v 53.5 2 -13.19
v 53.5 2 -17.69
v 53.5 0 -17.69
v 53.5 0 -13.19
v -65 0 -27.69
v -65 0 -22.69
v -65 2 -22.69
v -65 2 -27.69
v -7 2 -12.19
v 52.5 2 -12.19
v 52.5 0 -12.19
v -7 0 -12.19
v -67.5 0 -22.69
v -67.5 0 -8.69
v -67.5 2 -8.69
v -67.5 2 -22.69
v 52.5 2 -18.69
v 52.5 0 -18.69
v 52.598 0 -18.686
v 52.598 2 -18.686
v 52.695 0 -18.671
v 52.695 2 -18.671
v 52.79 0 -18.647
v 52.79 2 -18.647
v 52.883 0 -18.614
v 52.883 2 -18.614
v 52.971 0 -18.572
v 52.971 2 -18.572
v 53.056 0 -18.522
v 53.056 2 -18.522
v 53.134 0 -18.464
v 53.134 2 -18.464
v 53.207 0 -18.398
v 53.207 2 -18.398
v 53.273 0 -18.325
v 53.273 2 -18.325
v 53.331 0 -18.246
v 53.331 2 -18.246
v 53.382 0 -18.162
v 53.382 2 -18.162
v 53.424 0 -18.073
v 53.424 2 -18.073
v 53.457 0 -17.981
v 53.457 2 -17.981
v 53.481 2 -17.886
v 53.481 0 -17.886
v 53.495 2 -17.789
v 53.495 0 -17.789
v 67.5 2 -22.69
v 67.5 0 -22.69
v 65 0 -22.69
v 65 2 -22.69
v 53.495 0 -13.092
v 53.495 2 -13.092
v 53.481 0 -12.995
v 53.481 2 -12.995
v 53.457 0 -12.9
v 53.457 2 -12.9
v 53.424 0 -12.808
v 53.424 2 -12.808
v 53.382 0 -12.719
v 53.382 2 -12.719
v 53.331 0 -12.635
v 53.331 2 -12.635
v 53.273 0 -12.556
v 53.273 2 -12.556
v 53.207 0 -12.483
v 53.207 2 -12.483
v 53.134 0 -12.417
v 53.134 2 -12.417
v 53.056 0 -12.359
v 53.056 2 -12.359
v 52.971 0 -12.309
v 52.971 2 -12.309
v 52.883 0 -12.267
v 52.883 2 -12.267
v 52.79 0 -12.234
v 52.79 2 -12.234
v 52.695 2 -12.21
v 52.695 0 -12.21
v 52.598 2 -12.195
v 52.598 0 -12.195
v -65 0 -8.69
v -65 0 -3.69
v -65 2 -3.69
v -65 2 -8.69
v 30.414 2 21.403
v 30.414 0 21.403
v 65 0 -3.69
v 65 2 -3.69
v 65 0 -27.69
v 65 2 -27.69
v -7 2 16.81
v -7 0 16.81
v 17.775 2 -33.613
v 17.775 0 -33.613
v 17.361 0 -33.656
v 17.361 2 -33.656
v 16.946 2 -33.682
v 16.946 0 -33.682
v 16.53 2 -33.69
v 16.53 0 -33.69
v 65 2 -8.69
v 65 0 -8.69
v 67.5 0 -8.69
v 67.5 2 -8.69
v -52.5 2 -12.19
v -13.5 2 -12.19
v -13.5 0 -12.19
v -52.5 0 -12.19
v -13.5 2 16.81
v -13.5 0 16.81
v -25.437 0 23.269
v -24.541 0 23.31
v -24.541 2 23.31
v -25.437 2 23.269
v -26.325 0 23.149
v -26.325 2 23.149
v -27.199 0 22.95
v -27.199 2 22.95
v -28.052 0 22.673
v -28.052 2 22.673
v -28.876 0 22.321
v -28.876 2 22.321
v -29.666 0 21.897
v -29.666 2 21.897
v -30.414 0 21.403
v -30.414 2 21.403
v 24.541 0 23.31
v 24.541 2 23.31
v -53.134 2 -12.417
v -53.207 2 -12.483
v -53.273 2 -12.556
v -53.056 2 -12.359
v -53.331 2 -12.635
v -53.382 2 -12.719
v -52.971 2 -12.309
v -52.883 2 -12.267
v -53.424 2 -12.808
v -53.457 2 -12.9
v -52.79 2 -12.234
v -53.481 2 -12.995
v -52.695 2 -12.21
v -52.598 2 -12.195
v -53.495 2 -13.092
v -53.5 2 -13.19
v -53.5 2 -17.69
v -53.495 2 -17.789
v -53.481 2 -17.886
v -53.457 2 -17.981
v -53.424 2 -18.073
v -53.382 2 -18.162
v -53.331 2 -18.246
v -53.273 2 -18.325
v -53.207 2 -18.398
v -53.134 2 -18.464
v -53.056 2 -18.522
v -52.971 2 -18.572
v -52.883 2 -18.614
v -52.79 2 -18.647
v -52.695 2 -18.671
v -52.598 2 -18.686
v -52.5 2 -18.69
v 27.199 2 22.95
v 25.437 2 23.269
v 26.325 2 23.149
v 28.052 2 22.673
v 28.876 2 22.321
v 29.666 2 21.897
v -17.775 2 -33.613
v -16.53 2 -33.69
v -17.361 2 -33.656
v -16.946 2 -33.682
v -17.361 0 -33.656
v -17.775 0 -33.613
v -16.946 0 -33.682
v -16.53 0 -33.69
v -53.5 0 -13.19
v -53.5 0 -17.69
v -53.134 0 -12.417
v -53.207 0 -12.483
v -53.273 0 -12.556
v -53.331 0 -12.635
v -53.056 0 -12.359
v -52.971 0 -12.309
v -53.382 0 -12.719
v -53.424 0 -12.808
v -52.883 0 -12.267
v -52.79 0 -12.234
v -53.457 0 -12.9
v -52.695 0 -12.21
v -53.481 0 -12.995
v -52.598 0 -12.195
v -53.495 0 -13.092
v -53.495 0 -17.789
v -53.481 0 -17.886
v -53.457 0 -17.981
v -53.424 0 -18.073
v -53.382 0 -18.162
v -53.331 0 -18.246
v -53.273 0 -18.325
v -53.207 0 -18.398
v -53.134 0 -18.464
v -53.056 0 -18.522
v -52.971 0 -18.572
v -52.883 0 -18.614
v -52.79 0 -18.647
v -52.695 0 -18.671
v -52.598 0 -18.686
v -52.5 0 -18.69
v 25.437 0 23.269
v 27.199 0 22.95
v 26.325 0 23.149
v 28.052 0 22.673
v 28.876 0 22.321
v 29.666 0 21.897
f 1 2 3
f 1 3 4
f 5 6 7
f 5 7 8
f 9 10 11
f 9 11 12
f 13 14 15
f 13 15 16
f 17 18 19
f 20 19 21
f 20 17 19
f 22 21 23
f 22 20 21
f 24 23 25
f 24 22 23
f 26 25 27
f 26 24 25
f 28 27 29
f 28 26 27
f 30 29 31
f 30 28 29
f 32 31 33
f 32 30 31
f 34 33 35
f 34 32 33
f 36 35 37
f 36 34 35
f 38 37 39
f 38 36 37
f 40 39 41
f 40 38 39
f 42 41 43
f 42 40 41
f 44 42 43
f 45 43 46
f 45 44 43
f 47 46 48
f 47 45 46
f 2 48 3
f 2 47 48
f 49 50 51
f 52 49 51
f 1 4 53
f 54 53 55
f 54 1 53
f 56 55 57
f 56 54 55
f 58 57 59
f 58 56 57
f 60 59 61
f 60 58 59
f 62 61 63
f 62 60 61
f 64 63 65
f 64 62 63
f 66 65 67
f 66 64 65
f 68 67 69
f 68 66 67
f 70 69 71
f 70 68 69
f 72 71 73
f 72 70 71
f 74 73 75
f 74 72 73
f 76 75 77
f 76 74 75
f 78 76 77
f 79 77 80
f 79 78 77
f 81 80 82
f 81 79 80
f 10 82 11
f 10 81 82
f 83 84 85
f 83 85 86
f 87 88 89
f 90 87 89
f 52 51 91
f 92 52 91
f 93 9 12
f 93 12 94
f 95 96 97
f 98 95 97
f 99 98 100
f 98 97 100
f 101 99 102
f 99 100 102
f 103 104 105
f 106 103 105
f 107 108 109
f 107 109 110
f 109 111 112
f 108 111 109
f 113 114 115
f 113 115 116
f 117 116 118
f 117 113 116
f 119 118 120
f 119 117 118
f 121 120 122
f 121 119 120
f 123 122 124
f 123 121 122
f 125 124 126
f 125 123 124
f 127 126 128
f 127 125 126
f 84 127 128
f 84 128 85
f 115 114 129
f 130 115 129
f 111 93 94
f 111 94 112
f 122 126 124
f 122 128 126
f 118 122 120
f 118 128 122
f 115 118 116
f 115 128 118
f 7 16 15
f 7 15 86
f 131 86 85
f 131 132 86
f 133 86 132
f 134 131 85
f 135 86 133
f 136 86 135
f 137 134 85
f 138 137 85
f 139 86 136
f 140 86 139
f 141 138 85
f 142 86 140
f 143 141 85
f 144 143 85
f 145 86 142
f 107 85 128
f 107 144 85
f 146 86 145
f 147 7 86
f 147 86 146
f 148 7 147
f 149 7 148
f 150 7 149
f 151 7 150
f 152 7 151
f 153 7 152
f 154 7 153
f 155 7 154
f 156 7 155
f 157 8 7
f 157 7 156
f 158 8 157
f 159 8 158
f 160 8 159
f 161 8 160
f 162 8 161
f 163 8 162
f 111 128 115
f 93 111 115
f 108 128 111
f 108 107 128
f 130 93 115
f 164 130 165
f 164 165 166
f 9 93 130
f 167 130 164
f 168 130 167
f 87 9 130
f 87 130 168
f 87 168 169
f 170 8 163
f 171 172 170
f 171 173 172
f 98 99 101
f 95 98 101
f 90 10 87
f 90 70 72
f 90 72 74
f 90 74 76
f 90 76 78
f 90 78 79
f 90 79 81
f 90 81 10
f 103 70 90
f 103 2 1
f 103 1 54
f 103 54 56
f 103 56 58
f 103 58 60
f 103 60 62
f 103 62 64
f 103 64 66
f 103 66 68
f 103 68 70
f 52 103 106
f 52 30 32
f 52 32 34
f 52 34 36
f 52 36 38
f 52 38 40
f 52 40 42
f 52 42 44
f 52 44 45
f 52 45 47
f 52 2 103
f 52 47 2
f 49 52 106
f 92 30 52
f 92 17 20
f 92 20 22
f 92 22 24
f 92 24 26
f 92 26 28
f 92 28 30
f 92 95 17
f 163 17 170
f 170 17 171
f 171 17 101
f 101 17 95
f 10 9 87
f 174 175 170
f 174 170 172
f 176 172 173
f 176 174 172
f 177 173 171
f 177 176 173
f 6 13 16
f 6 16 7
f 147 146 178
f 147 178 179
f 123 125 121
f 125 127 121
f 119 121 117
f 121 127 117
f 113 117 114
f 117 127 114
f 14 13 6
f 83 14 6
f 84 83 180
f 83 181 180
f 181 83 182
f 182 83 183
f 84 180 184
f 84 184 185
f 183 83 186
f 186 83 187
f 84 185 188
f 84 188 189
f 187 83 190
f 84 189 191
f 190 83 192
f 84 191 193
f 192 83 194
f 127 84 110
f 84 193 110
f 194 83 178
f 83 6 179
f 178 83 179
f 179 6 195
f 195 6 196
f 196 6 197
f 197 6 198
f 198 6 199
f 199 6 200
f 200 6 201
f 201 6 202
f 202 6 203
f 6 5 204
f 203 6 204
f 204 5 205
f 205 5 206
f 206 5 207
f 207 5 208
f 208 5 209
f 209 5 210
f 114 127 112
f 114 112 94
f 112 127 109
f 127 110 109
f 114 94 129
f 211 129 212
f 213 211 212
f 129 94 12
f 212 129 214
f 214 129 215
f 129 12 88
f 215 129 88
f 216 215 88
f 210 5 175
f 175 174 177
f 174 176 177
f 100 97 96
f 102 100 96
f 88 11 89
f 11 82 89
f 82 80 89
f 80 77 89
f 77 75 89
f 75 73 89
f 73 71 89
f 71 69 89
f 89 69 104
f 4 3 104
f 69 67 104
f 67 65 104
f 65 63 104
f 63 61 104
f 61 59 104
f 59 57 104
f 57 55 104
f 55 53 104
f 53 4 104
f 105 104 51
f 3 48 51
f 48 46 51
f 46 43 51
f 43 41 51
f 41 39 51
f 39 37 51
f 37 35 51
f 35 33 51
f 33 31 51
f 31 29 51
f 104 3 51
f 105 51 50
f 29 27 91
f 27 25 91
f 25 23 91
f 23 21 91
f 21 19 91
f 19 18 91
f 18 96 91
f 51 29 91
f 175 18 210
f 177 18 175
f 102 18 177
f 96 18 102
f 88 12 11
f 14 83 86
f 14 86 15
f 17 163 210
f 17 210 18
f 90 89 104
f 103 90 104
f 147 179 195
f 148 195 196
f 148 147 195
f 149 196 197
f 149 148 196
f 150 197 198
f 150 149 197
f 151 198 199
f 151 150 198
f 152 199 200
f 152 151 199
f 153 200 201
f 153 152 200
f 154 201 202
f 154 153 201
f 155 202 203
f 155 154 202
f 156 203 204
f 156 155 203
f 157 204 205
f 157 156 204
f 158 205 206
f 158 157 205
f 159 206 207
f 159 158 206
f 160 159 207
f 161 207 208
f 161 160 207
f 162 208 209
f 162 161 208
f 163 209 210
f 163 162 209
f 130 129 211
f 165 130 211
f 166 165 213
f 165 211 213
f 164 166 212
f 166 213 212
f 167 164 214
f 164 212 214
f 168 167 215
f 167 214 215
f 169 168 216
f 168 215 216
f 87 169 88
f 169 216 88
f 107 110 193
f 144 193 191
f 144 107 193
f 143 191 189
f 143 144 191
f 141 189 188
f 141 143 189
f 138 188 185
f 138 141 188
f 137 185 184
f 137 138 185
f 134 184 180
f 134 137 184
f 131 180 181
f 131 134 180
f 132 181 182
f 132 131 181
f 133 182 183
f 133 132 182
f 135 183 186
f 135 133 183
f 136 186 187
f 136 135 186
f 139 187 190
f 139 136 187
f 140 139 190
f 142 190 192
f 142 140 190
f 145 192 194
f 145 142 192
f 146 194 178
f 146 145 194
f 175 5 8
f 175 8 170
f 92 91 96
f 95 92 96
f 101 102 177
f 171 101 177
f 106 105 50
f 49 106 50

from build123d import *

# Parameters (mm, degrees)
RESSALTO_EXTRUS_O1_DEPTH = 2
CORTE_EXTRUS_O1_DEPTH    = 3


with BuildPart() as part:
    # Esboço1 → Ressalto-extrusão1 (new body)
    with BuildSketch(Plane(origin=(0, 0, 0), x_dir=(1, 0, 0), z_dir=(0, 1, 0))):
        with BuildLine():
            Line((-65, 27.690493718), (-17.774626759, 33.612777476))
            ThreePointArc((-17.774626759, 33.612777476), (-17.153688565, 33.671045747), (-16.530325742, 33.690493718))
            Line((-16.530325742, 33.690493718), (0, 33.690493718))
            Line((0, 33.690493718), (0, -23.309506282))
            Line((0, -23.309506282), (-24.541301383, -23.309506282))
            ThreePointArc((-24.541301383, -23.309506282), (-27.628384162, -22.821073972), (-30.413900746, -21.403490265))
            Line((-30.413900746, -21.403490265), (-65, 3.690493718))
            Line((-65, 3.690493718), (-65, 8.690493718))
            Line((-65, 8.690493718), (-67.5, 8.690493718))
            Line((-67.5, 8.690493718), (-67.5, 22.690493718))
            Line((-67.5, 22.690493718), (-65, 22.690493718))
            Line((-65, 22.690493718), (-65, 27.690493718))
        make_face()
    ressalto_extrus_o1 = extrude(amount=RESSALTO_EXTRUS_O1_DEPTH)

    # Espelhar1: Ressalto-extrusão1 across plane
    add(ressalto_extrus_o1.mirror(Plane(origin=(0, 2, 23.309506282), x_dir=(0, 0, 1), z_dir=(-1, 0, 0))))

    # Esboço2 → Corte-extrusão1 (cut, through all)
    with BuildSketch(Plane(origin=(0, 2, 0), x_dir=(1, 0, 0), z_dir=(0, 1, 0))):
        with BuildLine():
            Line((-52.5, 18.690493718), (52.5, 18.690493718))
            ThreePointArc((52.5, 18.690493718), (53.207106781, 18.397600499), (53.5, 17.690493718))
            Line((53.5, 17.690493718), (53.5, 13.190493718))
            ThreePointArc((53.5, 13.190493718), (53.207106781, 12.483386937), (52.5, 12.190493718))
            Line((52.5, 12.190493718), (-7, 12.190493718))
            Line((-7, 12.190493718), (-7, -16.809506282))
            Line((-7, -16.809506282), (-13.5, -16.809506282))
            Line((-13.5, -16.809506282), (-13.5, 12.190493718))
            Line((-13.5, 12.190493718), (-52.5, 12.190493718))
            ThreePointArc((-52.5, 12.190493718), (-53.207106781, 12.483386937), (-53.5, 13.190493718))
            Line((-53.5, 13.190493718), (-53.5, 17.690493718))
            ThreePointArc((-53.5, 17.690493718), (-53.207106781, 18.397600499), (-52.5, 18.690493718))
        make_face()
    extrude(amount=-CORTE_EXTRUS_O1_DEPTH, mode=Mode.SUBTRACT)


solid = part.part
